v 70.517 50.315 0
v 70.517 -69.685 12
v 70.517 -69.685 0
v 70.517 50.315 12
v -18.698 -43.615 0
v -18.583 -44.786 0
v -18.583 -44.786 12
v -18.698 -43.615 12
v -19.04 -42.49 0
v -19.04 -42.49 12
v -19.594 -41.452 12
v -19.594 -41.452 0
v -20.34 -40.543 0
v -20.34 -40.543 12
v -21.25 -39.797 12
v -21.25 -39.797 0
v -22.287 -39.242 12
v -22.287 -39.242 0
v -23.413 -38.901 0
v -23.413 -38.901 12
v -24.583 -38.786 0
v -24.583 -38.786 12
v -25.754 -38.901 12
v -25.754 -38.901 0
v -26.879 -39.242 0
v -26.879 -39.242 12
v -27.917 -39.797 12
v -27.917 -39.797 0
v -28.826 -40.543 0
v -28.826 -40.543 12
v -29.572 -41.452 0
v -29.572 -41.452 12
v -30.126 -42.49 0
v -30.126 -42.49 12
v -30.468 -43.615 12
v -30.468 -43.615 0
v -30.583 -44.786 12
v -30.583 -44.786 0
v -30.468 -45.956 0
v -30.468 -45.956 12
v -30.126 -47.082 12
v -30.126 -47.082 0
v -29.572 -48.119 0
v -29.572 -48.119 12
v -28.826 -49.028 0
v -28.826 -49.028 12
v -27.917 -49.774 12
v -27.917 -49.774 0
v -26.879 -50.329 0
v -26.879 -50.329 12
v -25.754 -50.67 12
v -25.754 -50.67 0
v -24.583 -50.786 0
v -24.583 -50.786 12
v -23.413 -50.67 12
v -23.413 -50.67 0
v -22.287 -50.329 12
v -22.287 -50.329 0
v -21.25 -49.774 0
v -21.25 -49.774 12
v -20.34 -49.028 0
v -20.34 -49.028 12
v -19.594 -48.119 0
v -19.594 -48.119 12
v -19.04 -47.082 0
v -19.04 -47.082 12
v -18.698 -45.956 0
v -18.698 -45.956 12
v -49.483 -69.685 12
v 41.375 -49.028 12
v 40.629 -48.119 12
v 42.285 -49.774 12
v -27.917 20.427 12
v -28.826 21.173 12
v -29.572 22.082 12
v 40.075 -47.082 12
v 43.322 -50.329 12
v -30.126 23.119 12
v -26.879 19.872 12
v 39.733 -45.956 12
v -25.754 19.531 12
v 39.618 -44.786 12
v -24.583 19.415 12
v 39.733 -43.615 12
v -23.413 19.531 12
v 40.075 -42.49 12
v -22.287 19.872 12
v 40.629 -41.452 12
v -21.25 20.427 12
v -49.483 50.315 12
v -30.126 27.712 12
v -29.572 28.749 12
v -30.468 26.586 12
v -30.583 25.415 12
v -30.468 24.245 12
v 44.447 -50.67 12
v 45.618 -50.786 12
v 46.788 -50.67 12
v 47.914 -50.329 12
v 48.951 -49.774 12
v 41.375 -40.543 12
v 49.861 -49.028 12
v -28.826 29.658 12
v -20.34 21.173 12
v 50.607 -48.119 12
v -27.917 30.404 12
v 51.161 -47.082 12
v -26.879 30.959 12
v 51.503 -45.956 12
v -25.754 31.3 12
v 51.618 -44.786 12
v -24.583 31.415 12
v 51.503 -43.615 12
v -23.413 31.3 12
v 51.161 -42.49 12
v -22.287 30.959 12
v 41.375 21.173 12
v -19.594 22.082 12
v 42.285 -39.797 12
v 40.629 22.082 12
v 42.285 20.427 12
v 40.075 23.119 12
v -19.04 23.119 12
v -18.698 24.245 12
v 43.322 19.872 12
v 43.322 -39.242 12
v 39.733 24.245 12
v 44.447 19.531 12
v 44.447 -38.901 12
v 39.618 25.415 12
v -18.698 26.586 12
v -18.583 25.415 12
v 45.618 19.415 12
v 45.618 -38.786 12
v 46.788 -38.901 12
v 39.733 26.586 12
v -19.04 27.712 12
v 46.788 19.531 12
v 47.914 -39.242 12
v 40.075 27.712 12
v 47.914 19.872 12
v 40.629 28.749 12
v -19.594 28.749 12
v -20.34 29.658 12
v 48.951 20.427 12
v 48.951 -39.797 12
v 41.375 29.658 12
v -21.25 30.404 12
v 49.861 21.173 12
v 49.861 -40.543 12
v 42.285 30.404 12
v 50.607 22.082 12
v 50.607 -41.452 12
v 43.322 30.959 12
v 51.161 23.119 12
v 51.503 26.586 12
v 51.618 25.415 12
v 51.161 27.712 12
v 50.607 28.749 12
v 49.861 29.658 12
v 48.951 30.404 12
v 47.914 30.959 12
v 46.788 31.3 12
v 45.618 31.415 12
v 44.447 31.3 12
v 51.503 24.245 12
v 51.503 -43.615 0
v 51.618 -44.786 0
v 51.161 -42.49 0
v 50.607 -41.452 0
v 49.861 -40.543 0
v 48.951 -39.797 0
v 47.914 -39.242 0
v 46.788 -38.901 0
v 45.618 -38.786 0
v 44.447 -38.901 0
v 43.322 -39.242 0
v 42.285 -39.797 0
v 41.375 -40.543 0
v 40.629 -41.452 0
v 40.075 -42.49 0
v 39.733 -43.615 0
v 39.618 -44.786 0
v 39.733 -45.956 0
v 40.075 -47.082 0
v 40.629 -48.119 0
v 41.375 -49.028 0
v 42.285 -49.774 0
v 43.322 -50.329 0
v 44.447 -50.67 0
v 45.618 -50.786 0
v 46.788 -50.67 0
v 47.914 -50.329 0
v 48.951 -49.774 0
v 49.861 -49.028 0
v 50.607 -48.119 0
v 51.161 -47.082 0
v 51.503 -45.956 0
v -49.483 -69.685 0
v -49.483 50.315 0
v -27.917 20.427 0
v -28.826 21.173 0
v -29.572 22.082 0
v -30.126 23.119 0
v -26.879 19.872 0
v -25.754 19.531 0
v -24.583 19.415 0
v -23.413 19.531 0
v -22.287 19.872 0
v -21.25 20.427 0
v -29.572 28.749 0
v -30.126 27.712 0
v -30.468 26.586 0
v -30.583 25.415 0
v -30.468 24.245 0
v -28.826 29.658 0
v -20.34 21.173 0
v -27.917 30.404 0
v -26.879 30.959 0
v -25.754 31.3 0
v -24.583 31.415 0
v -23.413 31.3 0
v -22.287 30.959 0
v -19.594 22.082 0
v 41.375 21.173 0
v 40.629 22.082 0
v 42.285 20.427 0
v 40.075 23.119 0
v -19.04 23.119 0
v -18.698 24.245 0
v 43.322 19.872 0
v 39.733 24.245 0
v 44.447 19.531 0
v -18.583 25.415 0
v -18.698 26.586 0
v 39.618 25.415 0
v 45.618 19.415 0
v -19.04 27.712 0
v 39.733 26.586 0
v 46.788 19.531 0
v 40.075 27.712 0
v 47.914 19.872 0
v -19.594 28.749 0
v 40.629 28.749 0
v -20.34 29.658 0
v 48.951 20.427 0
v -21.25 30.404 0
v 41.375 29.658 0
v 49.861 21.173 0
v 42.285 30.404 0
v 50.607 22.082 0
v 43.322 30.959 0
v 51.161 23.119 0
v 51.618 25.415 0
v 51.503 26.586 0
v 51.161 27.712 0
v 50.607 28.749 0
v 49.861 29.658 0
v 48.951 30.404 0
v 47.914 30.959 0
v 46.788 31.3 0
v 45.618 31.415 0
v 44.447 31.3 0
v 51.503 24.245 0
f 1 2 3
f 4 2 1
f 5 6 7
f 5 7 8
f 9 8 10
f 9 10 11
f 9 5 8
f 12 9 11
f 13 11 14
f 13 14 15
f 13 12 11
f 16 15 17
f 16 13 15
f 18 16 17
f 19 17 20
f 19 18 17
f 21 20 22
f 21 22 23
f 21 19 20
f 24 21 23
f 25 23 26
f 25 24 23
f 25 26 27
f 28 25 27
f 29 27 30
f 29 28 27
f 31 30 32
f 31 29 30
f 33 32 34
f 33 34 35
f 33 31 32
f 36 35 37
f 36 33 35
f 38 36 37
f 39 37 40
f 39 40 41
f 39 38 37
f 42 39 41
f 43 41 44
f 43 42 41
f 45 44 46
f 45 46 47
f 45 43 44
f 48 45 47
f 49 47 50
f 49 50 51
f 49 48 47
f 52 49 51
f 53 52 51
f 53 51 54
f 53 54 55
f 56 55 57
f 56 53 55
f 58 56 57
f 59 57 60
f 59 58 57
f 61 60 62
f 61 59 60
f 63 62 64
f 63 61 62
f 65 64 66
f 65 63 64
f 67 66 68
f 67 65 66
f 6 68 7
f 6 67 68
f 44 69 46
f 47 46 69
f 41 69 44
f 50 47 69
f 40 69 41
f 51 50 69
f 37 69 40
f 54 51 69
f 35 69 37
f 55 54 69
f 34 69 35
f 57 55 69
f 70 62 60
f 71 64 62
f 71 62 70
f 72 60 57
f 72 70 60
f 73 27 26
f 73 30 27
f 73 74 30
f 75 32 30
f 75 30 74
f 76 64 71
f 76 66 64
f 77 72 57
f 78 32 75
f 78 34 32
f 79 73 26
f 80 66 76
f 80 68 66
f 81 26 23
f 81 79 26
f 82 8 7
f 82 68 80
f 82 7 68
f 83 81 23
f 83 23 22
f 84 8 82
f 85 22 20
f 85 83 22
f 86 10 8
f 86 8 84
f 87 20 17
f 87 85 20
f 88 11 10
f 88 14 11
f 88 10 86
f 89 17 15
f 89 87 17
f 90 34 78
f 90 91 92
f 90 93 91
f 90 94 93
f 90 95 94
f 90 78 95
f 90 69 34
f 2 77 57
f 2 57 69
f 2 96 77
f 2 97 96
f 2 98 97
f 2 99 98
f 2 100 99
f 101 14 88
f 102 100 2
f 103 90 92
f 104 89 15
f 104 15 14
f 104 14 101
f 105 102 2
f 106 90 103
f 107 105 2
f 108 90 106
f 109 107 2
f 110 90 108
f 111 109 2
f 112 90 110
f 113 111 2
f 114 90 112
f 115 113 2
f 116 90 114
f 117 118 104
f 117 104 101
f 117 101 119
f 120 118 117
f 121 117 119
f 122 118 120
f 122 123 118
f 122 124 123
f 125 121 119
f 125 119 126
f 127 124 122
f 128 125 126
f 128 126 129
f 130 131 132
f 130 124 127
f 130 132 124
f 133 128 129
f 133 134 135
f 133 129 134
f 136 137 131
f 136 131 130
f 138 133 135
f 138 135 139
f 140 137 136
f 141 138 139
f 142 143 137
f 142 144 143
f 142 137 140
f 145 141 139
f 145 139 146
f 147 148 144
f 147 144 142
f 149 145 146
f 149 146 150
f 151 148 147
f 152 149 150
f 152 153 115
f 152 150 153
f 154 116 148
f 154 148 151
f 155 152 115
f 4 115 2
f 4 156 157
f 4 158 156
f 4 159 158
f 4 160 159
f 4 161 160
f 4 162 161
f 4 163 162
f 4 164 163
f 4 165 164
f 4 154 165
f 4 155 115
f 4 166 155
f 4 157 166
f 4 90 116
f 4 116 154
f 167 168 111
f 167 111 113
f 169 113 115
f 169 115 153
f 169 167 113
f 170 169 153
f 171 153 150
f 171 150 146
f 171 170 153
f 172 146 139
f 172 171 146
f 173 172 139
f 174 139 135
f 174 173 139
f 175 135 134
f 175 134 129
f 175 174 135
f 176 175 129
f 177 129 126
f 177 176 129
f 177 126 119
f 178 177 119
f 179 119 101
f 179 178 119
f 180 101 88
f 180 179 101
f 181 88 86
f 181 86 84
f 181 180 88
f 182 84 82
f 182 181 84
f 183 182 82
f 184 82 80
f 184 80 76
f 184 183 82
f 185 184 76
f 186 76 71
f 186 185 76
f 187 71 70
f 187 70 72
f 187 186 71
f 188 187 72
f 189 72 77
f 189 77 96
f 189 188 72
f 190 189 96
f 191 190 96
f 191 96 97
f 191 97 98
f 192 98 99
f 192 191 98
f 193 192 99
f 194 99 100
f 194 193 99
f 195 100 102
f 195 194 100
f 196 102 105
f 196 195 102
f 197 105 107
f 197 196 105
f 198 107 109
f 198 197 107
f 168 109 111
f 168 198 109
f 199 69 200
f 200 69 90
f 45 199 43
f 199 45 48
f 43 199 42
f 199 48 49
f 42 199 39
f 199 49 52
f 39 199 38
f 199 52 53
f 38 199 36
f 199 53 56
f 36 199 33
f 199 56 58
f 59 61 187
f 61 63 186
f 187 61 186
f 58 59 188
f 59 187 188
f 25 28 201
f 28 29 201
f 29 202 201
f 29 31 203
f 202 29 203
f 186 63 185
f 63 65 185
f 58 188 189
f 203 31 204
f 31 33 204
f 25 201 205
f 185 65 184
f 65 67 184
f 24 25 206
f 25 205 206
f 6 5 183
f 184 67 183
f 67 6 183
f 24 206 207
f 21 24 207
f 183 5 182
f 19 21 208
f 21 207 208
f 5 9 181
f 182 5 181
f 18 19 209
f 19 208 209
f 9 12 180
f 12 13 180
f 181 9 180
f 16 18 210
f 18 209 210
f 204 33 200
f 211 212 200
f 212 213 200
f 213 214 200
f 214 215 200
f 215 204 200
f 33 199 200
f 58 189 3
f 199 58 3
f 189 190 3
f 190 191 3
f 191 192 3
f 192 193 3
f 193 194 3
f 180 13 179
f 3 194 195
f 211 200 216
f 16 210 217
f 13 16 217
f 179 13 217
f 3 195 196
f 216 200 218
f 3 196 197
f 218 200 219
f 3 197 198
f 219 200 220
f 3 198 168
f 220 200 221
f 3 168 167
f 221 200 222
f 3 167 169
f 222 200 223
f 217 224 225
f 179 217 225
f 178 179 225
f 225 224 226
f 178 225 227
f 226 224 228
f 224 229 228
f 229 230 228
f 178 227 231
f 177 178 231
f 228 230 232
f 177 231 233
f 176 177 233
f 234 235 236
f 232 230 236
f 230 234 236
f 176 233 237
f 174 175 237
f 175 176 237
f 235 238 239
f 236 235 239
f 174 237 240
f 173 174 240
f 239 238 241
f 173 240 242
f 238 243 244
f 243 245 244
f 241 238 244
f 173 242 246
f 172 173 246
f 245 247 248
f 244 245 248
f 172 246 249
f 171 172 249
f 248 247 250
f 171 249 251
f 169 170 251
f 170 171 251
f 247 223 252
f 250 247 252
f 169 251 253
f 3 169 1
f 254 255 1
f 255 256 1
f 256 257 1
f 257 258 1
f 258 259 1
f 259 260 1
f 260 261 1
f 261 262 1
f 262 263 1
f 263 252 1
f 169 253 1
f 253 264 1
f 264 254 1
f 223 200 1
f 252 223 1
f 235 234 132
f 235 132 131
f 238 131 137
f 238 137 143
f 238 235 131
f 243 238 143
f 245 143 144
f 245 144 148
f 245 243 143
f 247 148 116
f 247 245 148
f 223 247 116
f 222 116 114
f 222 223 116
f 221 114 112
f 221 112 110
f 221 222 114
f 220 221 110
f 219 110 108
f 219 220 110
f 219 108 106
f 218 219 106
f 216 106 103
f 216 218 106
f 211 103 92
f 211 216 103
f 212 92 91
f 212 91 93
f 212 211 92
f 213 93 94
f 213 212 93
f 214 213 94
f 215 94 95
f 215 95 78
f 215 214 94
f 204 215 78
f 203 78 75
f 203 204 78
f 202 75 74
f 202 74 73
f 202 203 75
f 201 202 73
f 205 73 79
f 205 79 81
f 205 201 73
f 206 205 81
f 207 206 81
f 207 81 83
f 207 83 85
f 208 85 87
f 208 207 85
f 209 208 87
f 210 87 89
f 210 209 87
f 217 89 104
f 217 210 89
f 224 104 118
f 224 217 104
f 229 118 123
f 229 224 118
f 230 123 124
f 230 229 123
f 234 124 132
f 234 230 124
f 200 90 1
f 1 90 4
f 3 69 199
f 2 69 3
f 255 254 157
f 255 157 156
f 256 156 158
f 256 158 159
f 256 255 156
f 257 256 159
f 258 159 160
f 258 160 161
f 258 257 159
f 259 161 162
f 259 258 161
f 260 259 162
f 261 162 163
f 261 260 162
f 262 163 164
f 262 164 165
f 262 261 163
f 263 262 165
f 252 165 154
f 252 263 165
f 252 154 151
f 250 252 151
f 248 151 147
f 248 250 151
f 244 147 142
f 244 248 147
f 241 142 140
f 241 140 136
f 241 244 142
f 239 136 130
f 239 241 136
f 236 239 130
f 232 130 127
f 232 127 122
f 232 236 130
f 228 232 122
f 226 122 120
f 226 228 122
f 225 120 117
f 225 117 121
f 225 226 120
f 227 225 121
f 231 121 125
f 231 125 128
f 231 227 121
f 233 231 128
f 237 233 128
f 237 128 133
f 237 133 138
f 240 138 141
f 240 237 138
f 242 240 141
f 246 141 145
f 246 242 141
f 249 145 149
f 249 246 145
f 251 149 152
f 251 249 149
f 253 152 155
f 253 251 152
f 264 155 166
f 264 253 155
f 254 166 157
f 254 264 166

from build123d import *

# Parameters (mm, degrees)
SZKIC1_W                    = 90
SZKIC1_H                    = 90
SZKIC1_R                    = 6
DODANIE_WYCI_GNI_CIE1_DEPTH = 12
SZKIC2_W                    = 120
SZKIC2_H                    = 120
SZKIC2_W_2                  = 90
SZKIC2_H_2                  = 90
DODANIE_WYCI_GNI_CIE3_DEPTH = 12


with BuildPart() as part:
    # Szkic1 → Dodanie-wyciągnięcie1 (new body)
    with BuildSketch(Plane.XY):
        with Locations((10.517420564, -9.685096154)):
            Rectangle(SZKIC1_W, SZKIC1_H)
        with Locations((-24.583084499, 25.41540891)):
            Circle(SZKIC1_R, mode=Mode.SUBTRACT)
        with Locations((-24.583084499, -44.785601217)):
            Circle(SZKIC1_R, mode=Mode.SUBTRACT)
        with Locations((45.617925627, -44.785601217)):
            Circle(SZKIC1_R, mode=Mode.SUBTRACT)
        with Locations((45.617925627, 25.41540891)):
            Circle(SZKIC1_R, mode=Mode.SUBTRACT)
    extrude(amount=DODANIE_WYCI_GNI_CIE1_DEPTH)

    # Szkic2 → Dodanie-wyciągnięcie3 (add)
    with BuildSketch(Plane.XY.offset(12)):
        with Locations((10.517420564, -9.685096154)):
            Rectangle(SZKIC2_W, SZKIC2_H)
        with Locations((10.517420564, -9.685096154)):
            Rectangle(SZKIC2_W_2, SZKIC2_H_2, mode=Mode.SUBTRACT)
    extrude(amount=-DODANIE_WYCI_GNI_CIE3_DEPTH)


solid = part.part
